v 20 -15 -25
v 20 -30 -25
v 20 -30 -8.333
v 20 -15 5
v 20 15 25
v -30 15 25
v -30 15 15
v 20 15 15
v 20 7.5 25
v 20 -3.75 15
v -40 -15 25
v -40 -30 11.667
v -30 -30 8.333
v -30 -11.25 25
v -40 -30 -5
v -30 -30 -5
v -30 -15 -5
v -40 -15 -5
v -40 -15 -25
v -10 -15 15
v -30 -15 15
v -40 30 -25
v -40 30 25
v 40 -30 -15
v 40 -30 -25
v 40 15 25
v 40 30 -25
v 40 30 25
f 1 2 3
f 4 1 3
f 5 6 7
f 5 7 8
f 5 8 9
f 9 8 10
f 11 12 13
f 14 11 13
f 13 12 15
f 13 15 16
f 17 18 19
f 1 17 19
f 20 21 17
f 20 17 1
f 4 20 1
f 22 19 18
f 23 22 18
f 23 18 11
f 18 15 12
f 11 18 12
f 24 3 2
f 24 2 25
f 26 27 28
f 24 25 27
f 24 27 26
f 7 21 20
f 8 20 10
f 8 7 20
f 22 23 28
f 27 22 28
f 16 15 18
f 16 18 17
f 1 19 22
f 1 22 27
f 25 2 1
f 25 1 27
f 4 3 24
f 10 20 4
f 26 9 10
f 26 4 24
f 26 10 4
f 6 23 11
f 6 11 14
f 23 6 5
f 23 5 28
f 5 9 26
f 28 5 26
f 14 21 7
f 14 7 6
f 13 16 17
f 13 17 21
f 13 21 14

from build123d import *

# Parameters (mm, degrees)
F0_W      = 80
F0_H      = 50
F1_DEPTH  = 30
F2_W      = 50
F2_H      = 45
F3_DEPTH  = 10
F4_W      = 50
F4_H      = 40
F5_DEPTH  = 15
F6_W      = 10
F6_H      = 20
F7_DEPTH  = 15
F11_W     = 98.4419174492
F11_H     = 69.922182709
F12_DEPTH = 30


with BuildPart() as f1:
    # F0 (on Front) → F1 (new body, symmetric)
    with BuildSketch(Plane.XZ):
        Rectangle(F0_W, F0_H)
    extrude(amount=F1_DEPTH, both=True)

    # F2 (on face) → F3 (cut)
    with BuildSketch(Plane.XY.offset(25)):
        with Locations((-5, -7.5)):
            Rectangle(F2_W, F2_H)
    extrude(amount=-F3_DEPTH, mode=Mode.SUBTRACT)

    # F4 (on face) → F5 (cut)
    with BuildSketch(Plane.XZ.offset(30)):
        with Locations((-5, -5)):
            Rectangle(F4_W, F4_H)
    extrude(amount=-F5_DEPTH, mode=Mode.SUBTRACT)

    # F6 (on face) → F7 (cut)
    with BuildSketch(Plane.XZ.offset(30)):
        with Locations((-35, -15)):
            Rectangle(F6_W, F6_H)
    extrude(amount=-F7_DEPTH, mode=Mode.SUBTRACT)

    # F11 (on 3pt) → F12 (cut)
    with BuildSketch(Plane(origin=(4.3831168831, -11.6883116883, 13.1493506494), x_dir=(0.9703393435, 0.1606078913, -0.1806838778), z_dir=(0.2417468892, -0.6446583712, 0.7252406676))):
        with Locations((-5.011850968, -1.6786511987)):
            Rectangle(F11_W, F11_H)
    extrude(amount=F12_DEPTH, mode=Mode.SUBTRACT)


solid = f1.part
